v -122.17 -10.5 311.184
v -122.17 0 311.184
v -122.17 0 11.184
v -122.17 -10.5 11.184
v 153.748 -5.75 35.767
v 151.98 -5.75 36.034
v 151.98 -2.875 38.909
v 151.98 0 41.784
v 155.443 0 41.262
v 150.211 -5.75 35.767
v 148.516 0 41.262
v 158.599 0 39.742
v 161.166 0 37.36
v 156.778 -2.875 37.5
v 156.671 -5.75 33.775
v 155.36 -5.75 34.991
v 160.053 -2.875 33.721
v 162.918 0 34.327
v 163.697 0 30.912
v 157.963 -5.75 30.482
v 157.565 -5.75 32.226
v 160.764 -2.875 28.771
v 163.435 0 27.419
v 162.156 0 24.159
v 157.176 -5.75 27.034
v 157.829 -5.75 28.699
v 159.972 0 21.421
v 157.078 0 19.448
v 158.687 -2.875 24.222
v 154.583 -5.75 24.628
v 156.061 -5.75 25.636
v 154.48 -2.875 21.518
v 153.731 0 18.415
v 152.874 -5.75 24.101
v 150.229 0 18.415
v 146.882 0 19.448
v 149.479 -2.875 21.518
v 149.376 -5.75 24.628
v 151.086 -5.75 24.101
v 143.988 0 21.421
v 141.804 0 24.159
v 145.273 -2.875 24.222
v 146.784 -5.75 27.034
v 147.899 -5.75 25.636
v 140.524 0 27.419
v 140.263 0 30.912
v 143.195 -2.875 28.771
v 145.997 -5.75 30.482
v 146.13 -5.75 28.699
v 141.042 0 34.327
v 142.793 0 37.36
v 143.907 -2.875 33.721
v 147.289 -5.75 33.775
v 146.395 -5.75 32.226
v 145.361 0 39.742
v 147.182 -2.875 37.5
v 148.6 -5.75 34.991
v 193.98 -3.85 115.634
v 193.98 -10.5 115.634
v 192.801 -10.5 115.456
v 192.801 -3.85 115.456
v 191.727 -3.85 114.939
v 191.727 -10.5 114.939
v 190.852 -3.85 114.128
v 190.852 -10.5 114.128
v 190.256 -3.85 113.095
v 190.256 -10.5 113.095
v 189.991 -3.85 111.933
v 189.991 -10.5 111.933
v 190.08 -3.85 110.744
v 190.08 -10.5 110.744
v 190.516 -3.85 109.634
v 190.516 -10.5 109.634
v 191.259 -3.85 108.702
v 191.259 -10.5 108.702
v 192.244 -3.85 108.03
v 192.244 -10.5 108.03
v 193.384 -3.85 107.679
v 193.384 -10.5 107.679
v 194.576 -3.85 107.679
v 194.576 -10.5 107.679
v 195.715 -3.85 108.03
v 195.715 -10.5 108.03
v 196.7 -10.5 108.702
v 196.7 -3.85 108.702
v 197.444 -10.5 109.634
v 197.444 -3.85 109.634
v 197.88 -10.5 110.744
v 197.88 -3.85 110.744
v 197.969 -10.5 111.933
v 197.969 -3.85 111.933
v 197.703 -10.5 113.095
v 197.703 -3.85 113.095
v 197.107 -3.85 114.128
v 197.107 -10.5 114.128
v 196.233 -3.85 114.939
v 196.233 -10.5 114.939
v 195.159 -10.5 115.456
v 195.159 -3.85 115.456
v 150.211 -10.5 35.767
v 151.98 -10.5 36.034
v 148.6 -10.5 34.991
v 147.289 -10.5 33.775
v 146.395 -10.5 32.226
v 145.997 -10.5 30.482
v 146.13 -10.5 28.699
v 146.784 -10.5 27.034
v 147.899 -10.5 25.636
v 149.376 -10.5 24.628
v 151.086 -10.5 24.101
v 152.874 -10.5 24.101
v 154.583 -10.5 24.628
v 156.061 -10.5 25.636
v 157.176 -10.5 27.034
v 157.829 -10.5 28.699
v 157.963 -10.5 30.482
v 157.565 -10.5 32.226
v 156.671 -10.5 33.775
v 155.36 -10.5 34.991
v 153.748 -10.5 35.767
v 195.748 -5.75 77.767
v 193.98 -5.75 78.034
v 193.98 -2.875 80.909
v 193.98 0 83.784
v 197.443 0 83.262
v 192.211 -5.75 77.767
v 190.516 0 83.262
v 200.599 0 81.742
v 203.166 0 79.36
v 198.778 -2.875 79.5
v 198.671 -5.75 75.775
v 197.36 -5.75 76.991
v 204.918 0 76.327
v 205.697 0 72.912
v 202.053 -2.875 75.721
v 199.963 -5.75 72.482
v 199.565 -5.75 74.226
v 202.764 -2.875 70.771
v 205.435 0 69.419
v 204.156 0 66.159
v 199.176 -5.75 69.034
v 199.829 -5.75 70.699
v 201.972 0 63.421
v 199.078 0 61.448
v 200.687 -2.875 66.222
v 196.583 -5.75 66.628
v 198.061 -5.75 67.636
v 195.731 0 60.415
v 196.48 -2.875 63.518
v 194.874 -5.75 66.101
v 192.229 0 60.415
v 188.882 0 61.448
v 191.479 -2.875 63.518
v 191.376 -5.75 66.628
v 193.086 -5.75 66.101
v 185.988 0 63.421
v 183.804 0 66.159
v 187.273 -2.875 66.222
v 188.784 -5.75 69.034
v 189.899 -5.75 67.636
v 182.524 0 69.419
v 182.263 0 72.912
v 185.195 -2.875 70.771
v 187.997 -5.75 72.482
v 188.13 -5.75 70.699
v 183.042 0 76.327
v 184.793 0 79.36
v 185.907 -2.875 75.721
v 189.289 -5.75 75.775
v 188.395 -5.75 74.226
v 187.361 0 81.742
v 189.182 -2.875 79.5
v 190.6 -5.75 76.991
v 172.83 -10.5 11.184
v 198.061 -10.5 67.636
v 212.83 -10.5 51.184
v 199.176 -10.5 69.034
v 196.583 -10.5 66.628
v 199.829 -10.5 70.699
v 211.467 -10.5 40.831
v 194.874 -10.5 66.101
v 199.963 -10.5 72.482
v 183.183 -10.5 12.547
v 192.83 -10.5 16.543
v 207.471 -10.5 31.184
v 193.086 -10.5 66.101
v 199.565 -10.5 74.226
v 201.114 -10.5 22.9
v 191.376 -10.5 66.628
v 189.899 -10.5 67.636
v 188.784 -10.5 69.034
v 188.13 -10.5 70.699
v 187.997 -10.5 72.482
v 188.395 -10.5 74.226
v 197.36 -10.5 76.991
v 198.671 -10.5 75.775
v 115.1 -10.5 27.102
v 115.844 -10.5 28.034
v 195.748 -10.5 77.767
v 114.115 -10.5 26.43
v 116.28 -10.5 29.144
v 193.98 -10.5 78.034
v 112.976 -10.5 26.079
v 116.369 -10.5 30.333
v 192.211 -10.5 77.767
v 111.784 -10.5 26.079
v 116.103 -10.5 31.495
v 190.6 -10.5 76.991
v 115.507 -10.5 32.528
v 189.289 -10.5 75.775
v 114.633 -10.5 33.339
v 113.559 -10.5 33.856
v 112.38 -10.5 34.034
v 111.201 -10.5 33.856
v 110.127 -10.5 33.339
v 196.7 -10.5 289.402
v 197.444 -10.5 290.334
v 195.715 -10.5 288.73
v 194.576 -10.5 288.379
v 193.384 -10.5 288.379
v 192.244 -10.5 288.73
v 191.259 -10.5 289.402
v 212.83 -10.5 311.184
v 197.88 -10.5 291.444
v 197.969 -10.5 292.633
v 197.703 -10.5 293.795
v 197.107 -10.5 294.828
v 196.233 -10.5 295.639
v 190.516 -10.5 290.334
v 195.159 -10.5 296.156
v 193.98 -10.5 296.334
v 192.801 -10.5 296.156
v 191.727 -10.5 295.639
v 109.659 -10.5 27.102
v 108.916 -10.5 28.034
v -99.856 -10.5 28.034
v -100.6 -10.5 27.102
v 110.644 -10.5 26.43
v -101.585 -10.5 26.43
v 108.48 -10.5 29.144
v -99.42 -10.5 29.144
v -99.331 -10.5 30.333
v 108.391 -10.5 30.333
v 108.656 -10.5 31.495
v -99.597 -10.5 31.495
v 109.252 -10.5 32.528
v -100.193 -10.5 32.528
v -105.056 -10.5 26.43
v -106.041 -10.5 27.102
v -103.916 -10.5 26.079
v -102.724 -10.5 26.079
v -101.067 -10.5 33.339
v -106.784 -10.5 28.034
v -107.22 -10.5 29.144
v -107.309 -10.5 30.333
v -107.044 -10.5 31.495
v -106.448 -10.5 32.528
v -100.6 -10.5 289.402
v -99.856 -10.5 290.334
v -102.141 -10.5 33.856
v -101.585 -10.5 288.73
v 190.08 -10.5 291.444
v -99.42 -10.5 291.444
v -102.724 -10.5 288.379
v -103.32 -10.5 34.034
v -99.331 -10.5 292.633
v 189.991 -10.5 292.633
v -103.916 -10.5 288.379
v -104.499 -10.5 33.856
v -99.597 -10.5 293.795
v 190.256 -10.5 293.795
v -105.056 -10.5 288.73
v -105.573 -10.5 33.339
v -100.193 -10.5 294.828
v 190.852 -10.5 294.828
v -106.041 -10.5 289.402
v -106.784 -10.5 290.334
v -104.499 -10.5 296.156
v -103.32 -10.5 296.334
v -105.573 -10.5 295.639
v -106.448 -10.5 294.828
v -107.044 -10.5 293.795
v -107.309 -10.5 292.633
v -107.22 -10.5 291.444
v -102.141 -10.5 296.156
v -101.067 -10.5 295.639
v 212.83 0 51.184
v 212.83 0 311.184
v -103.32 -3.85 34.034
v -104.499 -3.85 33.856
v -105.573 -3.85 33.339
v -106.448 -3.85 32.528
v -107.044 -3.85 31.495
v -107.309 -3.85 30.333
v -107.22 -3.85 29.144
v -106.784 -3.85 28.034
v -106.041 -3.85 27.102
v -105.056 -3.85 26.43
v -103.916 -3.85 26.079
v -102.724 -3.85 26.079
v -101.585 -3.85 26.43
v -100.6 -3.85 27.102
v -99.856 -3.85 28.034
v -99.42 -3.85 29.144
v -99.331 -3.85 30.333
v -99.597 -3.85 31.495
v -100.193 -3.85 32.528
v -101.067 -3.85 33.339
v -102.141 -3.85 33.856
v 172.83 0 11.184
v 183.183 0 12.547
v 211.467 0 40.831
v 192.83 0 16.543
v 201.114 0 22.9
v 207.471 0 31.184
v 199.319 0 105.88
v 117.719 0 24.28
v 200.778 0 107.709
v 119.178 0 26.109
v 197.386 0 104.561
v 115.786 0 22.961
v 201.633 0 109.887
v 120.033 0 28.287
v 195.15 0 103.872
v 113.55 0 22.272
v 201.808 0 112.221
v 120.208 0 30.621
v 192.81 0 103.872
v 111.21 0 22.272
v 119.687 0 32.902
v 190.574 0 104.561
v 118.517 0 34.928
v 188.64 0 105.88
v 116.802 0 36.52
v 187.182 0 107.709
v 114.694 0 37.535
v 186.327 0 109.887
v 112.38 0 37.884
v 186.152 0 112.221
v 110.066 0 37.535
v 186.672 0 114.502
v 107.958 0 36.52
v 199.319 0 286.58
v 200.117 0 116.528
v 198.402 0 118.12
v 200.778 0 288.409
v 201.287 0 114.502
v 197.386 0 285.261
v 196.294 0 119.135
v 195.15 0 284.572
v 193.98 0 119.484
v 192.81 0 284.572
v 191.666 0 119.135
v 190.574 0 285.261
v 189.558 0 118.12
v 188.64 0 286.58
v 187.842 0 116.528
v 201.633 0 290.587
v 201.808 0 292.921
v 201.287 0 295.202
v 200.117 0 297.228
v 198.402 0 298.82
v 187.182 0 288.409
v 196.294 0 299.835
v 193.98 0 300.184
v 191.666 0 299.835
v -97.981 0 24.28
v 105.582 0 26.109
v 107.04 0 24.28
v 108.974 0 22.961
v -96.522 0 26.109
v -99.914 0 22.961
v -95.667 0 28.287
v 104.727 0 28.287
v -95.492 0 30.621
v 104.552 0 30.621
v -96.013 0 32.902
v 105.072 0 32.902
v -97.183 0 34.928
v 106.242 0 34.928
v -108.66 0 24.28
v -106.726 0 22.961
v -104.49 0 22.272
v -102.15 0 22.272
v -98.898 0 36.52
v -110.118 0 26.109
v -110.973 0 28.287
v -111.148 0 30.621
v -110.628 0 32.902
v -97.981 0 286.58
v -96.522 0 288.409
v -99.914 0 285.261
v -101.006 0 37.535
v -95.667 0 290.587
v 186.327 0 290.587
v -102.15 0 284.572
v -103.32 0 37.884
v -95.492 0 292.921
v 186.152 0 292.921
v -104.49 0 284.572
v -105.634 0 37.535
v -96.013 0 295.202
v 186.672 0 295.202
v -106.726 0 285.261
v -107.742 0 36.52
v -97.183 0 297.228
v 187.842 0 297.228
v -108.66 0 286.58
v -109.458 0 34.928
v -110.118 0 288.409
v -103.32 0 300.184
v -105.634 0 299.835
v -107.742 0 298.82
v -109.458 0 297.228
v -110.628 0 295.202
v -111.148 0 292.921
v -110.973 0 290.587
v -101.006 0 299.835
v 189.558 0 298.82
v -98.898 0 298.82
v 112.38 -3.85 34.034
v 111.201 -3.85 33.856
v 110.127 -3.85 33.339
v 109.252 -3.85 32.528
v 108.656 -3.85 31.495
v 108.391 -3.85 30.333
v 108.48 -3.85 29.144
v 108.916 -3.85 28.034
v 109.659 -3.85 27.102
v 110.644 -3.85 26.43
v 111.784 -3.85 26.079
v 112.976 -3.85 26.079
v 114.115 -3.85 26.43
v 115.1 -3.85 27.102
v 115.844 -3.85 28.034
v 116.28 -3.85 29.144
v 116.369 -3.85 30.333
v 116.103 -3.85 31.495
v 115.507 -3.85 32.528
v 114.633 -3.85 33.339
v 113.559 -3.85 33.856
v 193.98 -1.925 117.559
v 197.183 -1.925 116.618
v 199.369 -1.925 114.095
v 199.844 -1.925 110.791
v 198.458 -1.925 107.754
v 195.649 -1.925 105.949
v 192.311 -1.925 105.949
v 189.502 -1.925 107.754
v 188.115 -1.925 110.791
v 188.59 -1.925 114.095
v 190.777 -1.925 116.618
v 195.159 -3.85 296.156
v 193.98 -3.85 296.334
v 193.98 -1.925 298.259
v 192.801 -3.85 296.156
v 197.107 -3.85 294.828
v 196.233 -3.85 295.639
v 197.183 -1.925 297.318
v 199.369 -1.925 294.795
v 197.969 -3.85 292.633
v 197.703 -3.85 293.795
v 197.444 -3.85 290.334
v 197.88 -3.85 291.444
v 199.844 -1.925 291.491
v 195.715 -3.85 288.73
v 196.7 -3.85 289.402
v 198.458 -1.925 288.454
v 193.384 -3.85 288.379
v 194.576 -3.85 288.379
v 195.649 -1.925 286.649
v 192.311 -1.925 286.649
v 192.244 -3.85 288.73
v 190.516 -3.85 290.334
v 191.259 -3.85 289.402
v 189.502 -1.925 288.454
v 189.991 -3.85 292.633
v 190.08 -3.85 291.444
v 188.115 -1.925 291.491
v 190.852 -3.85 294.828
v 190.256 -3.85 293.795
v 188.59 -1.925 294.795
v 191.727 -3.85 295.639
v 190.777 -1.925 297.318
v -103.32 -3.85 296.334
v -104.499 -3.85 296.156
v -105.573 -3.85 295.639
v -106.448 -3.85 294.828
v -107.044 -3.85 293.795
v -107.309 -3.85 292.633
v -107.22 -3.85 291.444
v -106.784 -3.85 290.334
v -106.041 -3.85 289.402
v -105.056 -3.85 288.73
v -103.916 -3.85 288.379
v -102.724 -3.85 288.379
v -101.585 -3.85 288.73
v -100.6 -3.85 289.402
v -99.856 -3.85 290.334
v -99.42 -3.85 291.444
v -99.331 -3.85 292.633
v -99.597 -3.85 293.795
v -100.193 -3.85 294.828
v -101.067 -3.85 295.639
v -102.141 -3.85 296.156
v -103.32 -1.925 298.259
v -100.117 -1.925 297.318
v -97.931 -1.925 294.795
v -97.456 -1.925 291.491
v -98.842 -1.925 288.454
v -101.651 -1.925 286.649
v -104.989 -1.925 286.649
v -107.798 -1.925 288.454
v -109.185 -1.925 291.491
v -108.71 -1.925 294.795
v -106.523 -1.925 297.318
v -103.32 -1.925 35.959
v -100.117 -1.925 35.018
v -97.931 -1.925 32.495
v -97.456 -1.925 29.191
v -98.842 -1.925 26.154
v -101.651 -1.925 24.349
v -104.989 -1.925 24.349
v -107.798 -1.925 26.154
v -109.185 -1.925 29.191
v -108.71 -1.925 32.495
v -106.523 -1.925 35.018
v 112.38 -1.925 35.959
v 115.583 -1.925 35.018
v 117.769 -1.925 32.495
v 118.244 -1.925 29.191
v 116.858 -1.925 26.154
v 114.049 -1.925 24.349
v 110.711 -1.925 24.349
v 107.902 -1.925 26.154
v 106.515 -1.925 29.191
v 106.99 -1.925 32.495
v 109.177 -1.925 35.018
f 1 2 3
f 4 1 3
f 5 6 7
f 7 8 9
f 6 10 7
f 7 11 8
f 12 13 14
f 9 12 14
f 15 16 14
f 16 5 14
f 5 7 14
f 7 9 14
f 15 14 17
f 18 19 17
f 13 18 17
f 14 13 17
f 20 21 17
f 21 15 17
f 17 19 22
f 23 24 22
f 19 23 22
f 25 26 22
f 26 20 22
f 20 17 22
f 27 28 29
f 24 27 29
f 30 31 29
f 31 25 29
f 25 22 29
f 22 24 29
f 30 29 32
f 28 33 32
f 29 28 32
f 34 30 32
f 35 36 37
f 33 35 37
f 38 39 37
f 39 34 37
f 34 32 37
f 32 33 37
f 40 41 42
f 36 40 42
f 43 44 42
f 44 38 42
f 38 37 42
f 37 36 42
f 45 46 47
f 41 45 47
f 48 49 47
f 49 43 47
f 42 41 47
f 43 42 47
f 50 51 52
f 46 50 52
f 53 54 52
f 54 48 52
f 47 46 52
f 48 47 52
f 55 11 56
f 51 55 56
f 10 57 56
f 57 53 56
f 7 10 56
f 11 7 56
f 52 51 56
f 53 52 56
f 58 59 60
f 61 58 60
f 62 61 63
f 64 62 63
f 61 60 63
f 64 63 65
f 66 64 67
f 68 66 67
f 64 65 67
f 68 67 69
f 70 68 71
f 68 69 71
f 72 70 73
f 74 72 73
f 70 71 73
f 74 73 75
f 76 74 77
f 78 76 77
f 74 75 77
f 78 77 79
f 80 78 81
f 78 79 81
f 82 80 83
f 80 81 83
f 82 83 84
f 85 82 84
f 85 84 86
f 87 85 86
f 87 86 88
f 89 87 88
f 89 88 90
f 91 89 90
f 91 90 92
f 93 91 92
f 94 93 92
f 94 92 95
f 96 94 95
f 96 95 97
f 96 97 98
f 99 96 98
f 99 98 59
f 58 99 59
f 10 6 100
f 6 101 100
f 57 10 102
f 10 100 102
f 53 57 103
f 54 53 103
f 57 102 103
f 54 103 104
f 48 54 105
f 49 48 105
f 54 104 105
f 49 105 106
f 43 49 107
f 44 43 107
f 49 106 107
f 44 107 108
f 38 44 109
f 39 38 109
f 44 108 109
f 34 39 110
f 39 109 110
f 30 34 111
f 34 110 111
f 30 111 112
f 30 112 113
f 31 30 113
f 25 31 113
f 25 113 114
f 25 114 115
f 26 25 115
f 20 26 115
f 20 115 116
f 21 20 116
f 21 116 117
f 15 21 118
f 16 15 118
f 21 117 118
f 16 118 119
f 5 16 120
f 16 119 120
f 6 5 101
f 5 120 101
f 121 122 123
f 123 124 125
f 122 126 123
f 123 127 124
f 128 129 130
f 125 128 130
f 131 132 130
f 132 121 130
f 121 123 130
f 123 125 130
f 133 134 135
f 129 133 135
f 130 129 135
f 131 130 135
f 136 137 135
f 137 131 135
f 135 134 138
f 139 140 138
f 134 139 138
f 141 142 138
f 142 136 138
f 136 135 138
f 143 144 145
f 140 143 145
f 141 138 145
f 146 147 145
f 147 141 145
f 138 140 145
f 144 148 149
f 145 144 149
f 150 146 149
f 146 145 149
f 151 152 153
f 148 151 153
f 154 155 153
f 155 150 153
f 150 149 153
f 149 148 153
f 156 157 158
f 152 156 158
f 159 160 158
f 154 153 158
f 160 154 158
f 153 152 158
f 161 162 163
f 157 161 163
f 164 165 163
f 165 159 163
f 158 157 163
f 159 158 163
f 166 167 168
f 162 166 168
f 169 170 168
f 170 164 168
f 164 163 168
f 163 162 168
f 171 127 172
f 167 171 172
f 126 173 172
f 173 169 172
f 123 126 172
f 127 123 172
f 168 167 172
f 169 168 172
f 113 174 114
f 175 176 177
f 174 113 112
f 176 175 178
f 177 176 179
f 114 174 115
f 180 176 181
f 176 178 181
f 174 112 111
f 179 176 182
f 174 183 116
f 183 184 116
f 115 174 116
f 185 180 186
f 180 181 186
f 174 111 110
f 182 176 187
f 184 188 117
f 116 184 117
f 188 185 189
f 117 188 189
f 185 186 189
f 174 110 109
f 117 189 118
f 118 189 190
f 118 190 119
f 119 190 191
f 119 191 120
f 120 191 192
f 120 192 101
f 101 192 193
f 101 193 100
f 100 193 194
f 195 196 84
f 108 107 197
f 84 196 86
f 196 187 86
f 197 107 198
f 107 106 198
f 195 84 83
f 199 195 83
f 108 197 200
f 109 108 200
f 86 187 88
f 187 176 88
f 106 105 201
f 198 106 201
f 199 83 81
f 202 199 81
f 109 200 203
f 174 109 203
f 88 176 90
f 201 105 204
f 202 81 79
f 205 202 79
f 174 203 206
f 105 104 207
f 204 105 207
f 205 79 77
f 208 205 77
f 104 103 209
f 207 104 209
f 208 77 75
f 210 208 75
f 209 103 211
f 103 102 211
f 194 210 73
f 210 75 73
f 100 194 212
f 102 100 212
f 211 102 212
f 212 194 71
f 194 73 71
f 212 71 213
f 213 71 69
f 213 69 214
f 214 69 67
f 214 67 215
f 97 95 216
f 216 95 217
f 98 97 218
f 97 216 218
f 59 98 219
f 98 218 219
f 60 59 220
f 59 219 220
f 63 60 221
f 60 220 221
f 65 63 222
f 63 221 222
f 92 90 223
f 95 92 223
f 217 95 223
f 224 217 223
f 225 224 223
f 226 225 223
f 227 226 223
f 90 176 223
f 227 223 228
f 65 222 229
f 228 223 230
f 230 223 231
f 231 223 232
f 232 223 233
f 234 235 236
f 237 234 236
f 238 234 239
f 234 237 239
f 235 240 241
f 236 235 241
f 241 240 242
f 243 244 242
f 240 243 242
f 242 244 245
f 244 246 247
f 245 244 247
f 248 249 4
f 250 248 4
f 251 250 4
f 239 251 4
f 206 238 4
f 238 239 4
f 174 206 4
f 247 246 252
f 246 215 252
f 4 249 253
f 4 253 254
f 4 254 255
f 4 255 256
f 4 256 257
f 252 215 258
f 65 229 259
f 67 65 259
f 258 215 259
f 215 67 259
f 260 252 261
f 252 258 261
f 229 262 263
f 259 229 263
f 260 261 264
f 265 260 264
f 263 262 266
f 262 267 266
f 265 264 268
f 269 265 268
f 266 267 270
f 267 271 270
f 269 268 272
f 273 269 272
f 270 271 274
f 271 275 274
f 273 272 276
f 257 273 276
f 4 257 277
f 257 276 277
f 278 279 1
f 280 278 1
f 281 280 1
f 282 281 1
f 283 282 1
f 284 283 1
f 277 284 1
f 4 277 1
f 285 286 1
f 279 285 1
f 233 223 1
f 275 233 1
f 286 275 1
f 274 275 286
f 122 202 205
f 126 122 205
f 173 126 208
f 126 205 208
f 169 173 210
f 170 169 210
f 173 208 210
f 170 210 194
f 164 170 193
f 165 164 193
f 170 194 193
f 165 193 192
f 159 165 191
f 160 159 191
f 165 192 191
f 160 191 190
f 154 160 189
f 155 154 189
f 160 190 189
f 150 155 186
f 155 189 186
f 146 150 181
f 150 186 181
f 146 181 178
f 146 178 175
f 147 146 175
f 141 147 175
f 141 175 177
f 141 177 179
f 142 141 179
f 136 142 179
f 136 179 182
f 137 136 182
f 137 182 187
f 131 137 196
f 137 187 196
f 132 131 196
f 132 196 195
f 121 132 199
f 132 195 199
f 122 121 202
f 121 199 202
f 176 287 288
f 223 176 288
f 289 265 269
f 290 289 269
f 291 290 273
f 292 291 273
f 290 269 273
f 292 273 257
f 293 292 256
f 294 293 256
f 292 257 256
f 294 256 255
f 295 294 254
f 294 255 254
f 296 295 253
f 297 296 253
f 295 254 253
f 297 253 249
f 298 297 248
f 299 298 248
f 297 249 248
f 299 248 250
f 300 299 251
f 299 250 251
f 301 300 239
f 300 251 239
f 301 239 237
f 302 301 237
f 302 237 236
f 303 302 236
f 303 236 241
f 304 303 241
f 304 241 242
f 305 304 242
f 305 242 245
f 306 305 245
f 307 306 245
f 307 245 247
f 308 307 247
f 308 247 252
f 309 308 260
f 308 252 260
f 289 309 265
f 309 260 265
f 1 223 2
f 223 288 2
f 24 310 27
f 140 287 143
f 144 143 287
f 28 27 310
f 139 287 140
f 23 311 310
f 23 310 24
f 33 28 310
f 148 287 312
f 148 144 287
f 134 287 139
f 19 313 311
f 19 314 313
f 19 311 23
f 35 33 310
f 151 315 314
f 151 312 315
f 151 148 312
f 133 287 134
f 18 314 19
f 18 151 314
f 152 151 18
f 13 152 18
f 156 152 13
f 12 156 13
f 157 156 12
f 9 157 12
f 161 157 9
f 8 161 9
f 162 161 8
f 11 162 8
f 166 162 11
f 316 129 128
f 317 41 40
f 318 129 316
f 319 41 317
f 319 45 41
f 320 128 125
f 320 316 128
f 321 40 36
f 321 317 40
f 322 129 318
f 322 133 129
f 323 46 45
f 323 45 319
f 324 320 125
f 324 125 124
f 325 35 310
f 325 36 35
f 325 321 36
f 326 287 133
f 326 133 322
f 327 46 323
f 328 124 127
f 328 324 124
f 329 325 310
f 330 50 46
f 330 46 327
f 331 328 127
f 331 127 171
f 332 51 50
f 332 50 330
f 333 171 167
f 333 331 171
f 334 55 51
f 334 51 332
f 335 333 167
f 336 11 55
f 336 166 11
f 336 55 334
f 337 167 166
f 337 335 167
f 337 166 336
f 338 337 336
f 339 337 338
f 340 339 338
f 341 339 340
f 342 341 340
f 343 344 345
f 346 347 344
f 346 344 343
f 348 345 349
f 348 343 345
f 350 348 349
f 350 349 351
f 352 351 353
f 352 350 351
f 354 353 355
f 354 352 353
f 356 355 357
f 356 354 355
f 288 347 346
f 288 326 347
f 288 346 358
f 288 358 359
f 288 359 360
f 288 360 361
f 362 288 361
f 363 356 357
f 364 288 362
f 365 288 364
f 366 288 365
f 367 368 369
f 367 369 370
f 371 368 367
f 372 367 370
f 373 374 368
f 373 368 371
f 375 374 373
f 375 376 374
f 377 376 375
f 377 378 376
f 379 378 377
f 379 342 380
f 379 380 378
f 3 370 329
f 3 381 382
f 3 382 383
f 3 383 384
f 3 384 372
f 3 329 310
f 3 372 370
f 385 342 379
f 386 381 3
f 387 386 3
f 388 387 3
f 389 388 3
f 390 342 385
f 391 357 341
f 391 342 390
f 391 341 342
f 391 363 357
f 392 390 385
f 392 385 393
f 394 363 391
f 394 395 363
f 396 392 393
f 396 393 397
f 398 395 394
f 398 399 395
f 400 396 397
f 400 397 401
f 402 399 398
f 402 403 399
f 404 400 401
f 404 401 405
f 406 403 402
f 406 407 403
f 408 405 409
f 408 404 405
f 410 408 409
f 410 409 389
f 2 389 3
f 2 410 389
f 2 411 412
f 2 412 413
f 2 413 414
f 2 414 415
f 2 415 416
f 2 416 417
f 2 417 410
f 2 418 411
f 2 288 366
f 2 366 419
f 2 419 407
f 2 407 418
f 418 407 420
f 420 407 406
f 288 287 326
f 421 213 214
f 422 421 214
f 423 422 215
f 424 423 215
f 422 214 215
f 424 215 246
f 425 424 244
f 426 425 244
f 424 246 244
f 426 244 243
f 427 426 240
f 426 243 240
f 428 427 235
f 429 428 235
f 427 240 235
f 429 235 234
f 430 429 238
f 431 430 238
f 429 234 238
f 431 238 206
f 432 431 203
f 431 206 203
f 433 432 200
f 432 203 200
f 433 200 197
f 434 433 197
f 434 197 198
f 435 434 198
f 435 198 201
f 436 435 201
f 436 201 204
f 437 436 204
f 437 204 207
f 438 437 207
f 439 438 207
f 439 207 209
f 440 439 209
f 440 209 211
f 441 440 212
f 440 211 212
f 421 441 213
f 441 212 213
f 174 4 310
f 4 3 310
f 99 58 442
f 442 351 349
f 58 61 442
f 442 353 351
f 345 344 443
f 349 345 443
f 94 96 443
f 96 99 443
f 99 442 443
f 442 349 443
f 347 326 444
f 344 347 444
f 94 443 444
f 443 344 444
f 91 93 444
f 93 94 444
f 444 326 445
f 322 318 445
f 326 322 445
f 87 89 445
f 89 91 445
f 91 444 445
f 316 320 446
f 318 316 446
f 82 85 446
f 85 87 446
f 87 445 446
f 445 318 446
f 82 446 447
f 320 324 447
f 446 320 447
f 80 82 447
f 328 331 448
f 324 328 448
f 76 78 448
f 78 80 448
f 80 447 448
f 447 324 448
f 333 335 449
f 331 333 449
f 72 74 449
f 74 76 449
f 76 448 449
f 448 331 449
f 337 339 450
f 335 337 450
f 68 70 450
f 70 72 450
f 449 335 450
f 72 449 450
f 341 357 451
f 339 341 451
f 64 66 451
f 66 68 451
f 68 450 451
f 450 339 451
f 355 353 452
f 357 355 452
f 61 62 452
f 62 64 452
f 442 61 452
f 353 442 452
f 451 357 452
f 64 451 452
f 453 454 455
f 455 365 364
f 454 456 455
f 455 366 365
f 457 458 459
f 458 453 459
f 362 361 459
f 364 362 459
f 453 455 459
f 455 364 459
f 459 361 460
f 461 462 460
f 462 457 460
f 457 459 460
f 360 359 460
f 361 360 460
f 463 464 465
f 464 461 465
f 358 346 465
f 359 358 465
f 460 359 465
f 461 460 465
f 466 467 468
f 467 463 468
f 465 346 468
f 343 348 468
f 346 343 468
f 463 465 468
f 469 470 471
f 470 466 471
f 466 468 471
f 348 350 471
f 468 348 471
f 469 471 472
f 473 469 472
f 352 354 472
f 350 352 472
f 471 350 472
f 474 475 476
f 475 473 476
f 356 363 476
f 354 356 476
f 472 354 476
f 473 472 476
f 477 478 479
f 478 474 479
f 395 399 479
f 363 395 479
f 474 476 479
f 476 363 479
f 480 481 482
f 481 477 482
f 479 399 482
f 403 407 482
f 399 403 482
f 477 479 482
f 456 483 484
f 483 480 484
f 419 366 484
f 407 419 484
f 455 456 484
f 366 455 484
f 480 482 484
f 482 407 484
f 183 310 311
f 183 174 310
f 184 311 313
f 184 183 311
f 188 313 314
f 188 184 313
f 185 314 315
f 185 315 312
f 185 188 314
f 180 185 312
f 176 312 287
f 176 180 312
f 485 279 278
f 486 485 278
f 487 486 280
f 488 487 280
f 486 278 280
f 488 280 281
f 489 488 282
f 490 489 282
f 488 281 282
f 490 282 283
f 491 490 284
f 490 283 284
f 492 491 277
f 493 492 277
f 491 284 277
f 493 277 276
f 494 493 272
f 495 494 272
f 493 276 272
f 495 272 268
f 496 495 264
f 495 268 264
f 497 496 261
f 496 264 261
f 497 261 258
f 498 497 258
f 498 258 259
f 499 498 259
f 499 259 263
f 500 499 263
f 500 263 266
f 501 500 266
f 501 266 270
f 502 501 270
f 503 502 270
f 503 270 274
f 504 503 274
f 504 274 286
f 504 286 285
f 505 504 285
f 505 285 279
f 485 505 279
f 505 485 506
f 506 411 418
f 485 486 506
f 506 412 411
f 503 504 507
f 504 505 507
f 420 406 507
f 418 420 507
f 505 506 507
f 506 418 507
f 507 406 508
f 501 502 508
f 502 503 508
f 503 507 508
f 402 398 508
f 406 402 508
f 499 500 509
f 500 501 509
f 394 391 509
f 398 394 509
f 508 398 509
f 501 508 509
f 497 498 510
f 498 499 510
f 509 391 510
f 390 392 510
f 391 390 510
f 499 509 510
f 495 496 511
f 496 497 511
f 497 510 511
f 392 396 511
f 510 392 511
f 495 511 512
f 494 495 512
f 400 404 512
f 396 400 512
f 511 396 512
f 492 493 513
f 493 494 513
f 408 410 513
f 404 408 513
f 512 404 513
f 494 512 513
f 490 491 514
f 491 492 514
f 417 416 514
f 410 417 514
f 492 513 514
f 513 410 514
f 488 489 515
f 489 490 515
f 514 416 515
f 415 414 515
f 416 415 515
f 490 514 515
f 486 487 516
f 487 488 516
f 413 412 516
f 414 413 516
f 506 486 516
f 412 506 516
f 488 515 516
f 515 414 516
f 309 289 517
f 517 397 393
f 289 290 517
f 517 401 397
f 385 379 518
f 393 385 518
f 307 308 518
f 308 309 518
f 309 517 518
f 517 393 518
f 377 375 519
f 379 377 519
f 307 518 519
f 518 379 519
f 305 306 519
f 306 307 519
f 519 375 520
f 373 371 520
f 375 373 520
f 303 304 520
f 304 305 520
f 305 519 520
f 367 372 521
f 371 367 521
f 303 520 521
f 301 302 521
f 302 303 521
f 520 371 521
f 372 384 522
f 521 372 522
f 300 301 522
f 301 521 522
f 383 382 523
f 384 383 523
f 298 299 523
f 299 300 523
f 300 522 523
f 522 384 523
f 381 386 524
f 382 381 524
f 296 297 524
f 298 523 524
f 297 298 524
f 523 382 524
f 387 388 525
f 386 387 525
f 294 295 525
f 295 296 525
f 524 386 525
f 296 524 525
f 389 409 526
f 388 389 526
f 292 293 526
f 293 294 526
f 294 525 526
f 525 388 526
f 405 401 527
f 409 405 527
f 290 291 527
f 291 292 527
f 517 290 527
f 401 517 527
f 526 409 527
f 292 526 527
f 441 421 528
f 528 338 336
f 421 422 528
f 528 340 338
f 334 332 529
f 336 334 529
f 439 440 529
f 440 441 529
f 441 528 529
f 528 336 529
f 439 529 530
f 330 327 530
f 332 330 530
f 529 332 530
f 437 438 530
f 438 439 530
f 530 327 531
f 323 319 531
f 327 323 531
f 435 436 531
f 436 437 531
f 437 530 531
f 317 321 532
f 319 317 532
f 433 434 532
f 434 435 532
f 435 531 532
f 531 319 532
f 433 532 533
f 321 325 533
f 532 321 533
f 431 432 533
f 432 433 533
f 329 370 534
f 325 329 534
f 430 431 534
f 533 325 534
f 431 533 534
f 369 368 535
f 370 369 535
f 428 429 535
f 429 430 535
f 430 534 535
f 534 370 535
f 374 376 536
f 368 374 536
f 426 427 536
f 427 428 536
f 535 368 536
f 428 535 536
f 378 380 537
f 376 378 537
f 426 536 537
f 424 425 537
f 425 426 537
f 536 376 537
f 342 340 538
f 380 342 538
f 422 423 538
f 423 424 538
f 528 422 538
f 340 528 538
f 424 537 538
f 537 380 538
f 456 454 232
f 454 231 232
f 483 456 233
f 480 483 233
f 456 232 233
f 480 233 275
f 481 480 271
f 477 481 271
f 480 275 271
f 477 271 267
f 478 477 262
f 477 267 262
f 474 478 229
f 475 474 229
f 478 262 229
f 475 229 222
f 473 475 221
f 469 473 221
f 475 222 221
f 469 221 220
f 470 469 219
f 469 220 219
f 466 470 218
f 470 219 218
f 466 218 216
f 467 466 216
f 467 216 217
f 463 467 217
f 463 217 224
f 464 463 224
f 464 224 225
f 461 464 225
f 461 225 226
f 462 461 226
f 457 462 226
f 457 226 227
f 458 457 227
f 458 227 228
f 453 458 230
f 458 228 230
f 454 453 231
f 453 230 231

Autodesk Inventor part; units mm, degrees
ref_plane "YZ Plane" through (0, 0, 0) normal (1, 0, 0) x (0, 1, 0)
ref_plane "XZ Plane" through (0, 0, 0) normal (0, 1, 0) x (-1, 0, 0)
ref_plane "XY Plane" through (0, 0, 0) normal (0, 0, 1) x (1, 0, 0)
sketch "Sketch1" plane through (0, 0, 0) normal (0, 1, 0) x (-1, 0, 0)
  circle A0 centre (275.1702, 127.184) radius 4.5 projected
  circle A1 centre (341.1702, 61.184) radius 4.5 projected
  circle A2 centre (341.1702, 193.184) radius 4.5 projected
  circle A3 centre (407.1702, 127.184) radius 4.5 projected
  line L0 (404.6478, 74.313) -> (450.2561, 28.7046) projected
  arc A4 (450.2561, 28.7046) -> (457.1702, 51.184) centre (417.1702, 51.184) ccw projected
  line L1 (457.1702, 51.184) -> (457.1702, 311.184) projected
  line L2 (457.1702, 311.184) -> (122.1702, 311.184) projected
  line L3 (122.1702, 311.184) -> (122.1702, 11.184) projected
  line L4 (122.1702, 11.184) -> (417.1702, 11.184) projected
  arc A5 (417.1702, 11.184) -> (439.6495, 18.098) centre (417.1702, 51.184) ccw projected
  line L5 (439.6495, 18.098) -> (394.0412, 63.7064) projected
  arc A6 (404.6478, 74.313) -> (394.0412, 63.7064) centre (399.3445, 69.0097) ccw projected
  circle A7 centre (438.3202, 72.034) radius 11.75 projected
  circle A8 centre (396.3202, 30.034) radius 11.75 projected
  circle A9 centre (356.7202, 30.034) radius 7.85 projected
  circle A10 centre (438.3202, 111.634) radius 7.85 projected
  circle A11 centre (141.0202, 292.334) radius 7.85 projected
  circle A12 centre (141.0202, 30.034) radius 7.85 projected
  circle A13 centre (438.3202, 292.334) radius 7.85 projected
  line L6 (122.1702, 11.184) -> (-212.8298, 11.184)
  line L7 (-212.8298, 11.184) -> (-212.8298, 311.184)
  line L8 (-212.8298, 311.184) -> (122.1702, 311.184)
  line L9 (122.1702, 311.184) -> (122.1702, 11.184)
  point P0 (0, 0)
  point P1 (-193.9798, 72.034)
  point P2 (-151.9798, 30.034)
  point P3 (-112.3798, 30.034)
  point P4 (-193.9798, 111.634)
  point P5 (103.3202, 292.334)
  point P6 (103.3202, 30.034)
  point P7 (-193.9798, 292.334)
  point P8 (103.3202, 292.334)
  point P9 (103.3202, 30.034)
  point P10 (-112.3798, 30.034)
  point P11 (-151.9798, 30.034)
  point P12 (-193.9798, 72.034)
  point P13 (-193.9798, 111.634)
  point P14 (-193.9798, 292.334)
  dimension "d0" = 335
  dimension "d1" = 300
  dimension "d2" = 0
  dimension "d3" = 0
extrude "Extrusion1" add sketch "Sketch1" against normal blind 10.5 contours L3 L6 L7 L8
hole "Hole2" at (-103.3202, 0, 292.334) at (-103.3202, 0, 30.034) at (112.3798, 0, 30.034) at (193.9798, 0, 111.634) at (193.9798, 0, 292.334) direction (0, -1, 0) diameter 8 end through all countersink diameter 15.7 countersink angle 90
hole "Hole3" at (151.9798, 0, 30.034) at (193.9798, 0, 72.034) direction (0, -1, 0) diameter 12 end through all countersink diameter 23.5 countersink angle 90
fillet "Fillet1" radius 40 1 edges at (212.8298, -5.25, 11.184)
properties part number "Right top plate"
